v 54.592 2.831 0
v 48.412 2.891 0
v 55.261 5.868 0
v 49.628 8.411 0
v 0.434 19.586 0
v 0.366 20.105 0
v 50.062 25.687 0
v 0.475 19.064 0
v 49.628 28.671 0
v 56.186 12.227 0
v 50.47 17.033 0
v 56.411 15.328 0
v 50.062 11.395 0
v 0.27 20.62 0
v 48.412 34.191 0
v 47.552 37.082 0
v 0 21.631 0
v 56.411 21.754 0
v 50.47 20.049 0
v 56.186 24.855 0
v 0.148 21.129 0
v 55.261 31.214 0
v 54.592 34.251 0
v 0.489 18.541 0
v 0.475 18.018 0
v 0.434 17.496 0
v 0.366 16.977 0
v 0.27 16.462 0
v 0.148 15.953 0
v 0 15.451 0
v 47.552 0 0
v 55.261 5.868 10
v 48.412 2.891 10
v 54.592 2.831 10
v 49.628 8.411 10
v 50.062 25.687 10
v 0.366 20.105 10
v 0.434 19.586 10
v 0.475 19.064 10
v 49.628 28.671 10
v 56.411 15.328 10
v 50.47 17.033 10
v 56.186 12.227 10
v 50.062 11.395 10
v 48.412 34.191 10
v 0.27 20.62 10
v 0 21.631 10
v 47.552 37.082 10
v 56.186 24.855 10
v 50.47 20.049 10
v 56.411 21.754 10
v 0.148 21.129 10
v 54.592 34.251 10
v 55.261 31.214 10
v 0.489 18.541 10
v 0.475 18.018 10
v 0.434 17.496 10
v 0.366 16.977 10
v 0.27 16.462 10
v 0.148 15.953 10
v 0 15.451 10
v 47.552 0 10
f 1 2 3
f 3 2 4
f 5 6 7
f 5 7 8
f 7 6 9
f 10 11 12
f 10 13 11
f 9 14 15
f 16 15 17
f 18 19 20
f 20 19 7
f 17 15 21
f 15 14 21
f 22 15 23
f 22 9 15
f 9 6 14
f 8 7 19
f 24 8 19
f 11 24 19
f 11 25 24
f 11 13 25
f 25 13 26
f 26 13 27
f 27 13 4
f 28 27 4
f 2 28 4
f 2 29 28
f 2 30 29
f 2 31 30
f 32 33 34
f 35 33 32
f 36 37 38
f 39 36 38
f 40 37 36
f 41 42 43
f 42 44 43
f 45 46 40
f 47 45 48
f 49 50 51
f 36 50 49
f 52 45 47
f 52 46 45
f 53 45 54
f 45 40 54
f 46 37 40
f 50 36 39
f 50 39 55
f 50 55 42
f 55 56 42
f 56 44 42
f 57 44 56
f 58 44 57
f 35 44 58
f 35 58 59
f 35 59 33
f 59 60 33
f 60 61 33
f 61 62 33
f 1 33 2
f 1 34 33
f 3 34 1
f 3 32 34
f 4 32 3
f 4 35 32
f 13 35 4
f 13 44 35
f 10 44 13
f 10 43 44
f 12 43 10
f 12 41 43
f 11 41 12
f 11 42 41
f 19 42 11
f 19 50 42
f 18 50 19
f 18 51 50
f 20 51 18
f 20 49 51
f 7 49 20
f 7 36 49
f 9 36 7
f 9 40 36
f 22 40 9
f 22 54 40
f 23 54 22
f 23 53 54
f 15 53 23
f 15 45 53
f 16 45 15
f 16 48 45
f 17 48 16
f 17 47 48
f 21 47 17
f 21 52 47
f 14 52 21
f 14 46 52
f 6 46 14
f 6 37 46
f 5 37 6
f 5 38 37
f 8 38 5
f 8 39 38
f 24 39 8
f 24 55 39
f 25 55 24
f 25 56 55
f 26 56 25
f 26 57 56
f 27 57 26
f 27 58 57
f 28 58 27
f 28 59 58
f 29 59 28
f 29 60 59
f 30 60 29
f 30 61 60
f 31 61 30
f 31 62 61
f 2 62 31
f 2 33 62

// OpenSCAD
$fn = 32;

// ----------------------------------------------------------------------
// Gear sector: 4 teeth on 36 degrees
// ----------------------------------------------------------------------

// --- parameters (mm) ---
sector_angle = 36;        // sector angle, degrees
root_r = 60;              // root circle radius
tooth_h = 6;              // tooth height over the root circle
teeth = 4;                // number of teeth on the sector
hub_r = 10;               // hub bore radius
plate_t = 10;             // sector thickness, Z
arc_step = 3;             // sampling step of the root/hub arcs, degrees

tip_r = root_r + tooth_h;  // tip circle radius

profile = [[47.552, 0], [48.412, 2.891], [54.592, 2.831], [55.261, 5.868], [49.628, 8.411], [50.062, 11.395], [56.186, 12.227], [56.411, 15.328], [50.47, 17.033], [50.47, 20.049], [56.411, 21.754], [56.186, 24.855], [50.062, 25.687], [49.628, 28.671], [55.261, 31.214], [54.592, 34.251], [48.412, 34.191], [47.552, 37.082], [0, 21.631], [0.148, 21.129], [0.27, 20.62], [0.366, 20.105], [0.434, 19.586], [0.475, 19.064], [0.489, 18.541], [0.475, 18.018], [0.434, 17.496], [0.366, 16.977], [0.27, 16.462], [0.148, 15.953], [0, 15.451]];  // primary outline, 31 points, counter clockwise

// --- the one profile operation ---
linear_extrude(height = plate_t) polygon(points = profile);
